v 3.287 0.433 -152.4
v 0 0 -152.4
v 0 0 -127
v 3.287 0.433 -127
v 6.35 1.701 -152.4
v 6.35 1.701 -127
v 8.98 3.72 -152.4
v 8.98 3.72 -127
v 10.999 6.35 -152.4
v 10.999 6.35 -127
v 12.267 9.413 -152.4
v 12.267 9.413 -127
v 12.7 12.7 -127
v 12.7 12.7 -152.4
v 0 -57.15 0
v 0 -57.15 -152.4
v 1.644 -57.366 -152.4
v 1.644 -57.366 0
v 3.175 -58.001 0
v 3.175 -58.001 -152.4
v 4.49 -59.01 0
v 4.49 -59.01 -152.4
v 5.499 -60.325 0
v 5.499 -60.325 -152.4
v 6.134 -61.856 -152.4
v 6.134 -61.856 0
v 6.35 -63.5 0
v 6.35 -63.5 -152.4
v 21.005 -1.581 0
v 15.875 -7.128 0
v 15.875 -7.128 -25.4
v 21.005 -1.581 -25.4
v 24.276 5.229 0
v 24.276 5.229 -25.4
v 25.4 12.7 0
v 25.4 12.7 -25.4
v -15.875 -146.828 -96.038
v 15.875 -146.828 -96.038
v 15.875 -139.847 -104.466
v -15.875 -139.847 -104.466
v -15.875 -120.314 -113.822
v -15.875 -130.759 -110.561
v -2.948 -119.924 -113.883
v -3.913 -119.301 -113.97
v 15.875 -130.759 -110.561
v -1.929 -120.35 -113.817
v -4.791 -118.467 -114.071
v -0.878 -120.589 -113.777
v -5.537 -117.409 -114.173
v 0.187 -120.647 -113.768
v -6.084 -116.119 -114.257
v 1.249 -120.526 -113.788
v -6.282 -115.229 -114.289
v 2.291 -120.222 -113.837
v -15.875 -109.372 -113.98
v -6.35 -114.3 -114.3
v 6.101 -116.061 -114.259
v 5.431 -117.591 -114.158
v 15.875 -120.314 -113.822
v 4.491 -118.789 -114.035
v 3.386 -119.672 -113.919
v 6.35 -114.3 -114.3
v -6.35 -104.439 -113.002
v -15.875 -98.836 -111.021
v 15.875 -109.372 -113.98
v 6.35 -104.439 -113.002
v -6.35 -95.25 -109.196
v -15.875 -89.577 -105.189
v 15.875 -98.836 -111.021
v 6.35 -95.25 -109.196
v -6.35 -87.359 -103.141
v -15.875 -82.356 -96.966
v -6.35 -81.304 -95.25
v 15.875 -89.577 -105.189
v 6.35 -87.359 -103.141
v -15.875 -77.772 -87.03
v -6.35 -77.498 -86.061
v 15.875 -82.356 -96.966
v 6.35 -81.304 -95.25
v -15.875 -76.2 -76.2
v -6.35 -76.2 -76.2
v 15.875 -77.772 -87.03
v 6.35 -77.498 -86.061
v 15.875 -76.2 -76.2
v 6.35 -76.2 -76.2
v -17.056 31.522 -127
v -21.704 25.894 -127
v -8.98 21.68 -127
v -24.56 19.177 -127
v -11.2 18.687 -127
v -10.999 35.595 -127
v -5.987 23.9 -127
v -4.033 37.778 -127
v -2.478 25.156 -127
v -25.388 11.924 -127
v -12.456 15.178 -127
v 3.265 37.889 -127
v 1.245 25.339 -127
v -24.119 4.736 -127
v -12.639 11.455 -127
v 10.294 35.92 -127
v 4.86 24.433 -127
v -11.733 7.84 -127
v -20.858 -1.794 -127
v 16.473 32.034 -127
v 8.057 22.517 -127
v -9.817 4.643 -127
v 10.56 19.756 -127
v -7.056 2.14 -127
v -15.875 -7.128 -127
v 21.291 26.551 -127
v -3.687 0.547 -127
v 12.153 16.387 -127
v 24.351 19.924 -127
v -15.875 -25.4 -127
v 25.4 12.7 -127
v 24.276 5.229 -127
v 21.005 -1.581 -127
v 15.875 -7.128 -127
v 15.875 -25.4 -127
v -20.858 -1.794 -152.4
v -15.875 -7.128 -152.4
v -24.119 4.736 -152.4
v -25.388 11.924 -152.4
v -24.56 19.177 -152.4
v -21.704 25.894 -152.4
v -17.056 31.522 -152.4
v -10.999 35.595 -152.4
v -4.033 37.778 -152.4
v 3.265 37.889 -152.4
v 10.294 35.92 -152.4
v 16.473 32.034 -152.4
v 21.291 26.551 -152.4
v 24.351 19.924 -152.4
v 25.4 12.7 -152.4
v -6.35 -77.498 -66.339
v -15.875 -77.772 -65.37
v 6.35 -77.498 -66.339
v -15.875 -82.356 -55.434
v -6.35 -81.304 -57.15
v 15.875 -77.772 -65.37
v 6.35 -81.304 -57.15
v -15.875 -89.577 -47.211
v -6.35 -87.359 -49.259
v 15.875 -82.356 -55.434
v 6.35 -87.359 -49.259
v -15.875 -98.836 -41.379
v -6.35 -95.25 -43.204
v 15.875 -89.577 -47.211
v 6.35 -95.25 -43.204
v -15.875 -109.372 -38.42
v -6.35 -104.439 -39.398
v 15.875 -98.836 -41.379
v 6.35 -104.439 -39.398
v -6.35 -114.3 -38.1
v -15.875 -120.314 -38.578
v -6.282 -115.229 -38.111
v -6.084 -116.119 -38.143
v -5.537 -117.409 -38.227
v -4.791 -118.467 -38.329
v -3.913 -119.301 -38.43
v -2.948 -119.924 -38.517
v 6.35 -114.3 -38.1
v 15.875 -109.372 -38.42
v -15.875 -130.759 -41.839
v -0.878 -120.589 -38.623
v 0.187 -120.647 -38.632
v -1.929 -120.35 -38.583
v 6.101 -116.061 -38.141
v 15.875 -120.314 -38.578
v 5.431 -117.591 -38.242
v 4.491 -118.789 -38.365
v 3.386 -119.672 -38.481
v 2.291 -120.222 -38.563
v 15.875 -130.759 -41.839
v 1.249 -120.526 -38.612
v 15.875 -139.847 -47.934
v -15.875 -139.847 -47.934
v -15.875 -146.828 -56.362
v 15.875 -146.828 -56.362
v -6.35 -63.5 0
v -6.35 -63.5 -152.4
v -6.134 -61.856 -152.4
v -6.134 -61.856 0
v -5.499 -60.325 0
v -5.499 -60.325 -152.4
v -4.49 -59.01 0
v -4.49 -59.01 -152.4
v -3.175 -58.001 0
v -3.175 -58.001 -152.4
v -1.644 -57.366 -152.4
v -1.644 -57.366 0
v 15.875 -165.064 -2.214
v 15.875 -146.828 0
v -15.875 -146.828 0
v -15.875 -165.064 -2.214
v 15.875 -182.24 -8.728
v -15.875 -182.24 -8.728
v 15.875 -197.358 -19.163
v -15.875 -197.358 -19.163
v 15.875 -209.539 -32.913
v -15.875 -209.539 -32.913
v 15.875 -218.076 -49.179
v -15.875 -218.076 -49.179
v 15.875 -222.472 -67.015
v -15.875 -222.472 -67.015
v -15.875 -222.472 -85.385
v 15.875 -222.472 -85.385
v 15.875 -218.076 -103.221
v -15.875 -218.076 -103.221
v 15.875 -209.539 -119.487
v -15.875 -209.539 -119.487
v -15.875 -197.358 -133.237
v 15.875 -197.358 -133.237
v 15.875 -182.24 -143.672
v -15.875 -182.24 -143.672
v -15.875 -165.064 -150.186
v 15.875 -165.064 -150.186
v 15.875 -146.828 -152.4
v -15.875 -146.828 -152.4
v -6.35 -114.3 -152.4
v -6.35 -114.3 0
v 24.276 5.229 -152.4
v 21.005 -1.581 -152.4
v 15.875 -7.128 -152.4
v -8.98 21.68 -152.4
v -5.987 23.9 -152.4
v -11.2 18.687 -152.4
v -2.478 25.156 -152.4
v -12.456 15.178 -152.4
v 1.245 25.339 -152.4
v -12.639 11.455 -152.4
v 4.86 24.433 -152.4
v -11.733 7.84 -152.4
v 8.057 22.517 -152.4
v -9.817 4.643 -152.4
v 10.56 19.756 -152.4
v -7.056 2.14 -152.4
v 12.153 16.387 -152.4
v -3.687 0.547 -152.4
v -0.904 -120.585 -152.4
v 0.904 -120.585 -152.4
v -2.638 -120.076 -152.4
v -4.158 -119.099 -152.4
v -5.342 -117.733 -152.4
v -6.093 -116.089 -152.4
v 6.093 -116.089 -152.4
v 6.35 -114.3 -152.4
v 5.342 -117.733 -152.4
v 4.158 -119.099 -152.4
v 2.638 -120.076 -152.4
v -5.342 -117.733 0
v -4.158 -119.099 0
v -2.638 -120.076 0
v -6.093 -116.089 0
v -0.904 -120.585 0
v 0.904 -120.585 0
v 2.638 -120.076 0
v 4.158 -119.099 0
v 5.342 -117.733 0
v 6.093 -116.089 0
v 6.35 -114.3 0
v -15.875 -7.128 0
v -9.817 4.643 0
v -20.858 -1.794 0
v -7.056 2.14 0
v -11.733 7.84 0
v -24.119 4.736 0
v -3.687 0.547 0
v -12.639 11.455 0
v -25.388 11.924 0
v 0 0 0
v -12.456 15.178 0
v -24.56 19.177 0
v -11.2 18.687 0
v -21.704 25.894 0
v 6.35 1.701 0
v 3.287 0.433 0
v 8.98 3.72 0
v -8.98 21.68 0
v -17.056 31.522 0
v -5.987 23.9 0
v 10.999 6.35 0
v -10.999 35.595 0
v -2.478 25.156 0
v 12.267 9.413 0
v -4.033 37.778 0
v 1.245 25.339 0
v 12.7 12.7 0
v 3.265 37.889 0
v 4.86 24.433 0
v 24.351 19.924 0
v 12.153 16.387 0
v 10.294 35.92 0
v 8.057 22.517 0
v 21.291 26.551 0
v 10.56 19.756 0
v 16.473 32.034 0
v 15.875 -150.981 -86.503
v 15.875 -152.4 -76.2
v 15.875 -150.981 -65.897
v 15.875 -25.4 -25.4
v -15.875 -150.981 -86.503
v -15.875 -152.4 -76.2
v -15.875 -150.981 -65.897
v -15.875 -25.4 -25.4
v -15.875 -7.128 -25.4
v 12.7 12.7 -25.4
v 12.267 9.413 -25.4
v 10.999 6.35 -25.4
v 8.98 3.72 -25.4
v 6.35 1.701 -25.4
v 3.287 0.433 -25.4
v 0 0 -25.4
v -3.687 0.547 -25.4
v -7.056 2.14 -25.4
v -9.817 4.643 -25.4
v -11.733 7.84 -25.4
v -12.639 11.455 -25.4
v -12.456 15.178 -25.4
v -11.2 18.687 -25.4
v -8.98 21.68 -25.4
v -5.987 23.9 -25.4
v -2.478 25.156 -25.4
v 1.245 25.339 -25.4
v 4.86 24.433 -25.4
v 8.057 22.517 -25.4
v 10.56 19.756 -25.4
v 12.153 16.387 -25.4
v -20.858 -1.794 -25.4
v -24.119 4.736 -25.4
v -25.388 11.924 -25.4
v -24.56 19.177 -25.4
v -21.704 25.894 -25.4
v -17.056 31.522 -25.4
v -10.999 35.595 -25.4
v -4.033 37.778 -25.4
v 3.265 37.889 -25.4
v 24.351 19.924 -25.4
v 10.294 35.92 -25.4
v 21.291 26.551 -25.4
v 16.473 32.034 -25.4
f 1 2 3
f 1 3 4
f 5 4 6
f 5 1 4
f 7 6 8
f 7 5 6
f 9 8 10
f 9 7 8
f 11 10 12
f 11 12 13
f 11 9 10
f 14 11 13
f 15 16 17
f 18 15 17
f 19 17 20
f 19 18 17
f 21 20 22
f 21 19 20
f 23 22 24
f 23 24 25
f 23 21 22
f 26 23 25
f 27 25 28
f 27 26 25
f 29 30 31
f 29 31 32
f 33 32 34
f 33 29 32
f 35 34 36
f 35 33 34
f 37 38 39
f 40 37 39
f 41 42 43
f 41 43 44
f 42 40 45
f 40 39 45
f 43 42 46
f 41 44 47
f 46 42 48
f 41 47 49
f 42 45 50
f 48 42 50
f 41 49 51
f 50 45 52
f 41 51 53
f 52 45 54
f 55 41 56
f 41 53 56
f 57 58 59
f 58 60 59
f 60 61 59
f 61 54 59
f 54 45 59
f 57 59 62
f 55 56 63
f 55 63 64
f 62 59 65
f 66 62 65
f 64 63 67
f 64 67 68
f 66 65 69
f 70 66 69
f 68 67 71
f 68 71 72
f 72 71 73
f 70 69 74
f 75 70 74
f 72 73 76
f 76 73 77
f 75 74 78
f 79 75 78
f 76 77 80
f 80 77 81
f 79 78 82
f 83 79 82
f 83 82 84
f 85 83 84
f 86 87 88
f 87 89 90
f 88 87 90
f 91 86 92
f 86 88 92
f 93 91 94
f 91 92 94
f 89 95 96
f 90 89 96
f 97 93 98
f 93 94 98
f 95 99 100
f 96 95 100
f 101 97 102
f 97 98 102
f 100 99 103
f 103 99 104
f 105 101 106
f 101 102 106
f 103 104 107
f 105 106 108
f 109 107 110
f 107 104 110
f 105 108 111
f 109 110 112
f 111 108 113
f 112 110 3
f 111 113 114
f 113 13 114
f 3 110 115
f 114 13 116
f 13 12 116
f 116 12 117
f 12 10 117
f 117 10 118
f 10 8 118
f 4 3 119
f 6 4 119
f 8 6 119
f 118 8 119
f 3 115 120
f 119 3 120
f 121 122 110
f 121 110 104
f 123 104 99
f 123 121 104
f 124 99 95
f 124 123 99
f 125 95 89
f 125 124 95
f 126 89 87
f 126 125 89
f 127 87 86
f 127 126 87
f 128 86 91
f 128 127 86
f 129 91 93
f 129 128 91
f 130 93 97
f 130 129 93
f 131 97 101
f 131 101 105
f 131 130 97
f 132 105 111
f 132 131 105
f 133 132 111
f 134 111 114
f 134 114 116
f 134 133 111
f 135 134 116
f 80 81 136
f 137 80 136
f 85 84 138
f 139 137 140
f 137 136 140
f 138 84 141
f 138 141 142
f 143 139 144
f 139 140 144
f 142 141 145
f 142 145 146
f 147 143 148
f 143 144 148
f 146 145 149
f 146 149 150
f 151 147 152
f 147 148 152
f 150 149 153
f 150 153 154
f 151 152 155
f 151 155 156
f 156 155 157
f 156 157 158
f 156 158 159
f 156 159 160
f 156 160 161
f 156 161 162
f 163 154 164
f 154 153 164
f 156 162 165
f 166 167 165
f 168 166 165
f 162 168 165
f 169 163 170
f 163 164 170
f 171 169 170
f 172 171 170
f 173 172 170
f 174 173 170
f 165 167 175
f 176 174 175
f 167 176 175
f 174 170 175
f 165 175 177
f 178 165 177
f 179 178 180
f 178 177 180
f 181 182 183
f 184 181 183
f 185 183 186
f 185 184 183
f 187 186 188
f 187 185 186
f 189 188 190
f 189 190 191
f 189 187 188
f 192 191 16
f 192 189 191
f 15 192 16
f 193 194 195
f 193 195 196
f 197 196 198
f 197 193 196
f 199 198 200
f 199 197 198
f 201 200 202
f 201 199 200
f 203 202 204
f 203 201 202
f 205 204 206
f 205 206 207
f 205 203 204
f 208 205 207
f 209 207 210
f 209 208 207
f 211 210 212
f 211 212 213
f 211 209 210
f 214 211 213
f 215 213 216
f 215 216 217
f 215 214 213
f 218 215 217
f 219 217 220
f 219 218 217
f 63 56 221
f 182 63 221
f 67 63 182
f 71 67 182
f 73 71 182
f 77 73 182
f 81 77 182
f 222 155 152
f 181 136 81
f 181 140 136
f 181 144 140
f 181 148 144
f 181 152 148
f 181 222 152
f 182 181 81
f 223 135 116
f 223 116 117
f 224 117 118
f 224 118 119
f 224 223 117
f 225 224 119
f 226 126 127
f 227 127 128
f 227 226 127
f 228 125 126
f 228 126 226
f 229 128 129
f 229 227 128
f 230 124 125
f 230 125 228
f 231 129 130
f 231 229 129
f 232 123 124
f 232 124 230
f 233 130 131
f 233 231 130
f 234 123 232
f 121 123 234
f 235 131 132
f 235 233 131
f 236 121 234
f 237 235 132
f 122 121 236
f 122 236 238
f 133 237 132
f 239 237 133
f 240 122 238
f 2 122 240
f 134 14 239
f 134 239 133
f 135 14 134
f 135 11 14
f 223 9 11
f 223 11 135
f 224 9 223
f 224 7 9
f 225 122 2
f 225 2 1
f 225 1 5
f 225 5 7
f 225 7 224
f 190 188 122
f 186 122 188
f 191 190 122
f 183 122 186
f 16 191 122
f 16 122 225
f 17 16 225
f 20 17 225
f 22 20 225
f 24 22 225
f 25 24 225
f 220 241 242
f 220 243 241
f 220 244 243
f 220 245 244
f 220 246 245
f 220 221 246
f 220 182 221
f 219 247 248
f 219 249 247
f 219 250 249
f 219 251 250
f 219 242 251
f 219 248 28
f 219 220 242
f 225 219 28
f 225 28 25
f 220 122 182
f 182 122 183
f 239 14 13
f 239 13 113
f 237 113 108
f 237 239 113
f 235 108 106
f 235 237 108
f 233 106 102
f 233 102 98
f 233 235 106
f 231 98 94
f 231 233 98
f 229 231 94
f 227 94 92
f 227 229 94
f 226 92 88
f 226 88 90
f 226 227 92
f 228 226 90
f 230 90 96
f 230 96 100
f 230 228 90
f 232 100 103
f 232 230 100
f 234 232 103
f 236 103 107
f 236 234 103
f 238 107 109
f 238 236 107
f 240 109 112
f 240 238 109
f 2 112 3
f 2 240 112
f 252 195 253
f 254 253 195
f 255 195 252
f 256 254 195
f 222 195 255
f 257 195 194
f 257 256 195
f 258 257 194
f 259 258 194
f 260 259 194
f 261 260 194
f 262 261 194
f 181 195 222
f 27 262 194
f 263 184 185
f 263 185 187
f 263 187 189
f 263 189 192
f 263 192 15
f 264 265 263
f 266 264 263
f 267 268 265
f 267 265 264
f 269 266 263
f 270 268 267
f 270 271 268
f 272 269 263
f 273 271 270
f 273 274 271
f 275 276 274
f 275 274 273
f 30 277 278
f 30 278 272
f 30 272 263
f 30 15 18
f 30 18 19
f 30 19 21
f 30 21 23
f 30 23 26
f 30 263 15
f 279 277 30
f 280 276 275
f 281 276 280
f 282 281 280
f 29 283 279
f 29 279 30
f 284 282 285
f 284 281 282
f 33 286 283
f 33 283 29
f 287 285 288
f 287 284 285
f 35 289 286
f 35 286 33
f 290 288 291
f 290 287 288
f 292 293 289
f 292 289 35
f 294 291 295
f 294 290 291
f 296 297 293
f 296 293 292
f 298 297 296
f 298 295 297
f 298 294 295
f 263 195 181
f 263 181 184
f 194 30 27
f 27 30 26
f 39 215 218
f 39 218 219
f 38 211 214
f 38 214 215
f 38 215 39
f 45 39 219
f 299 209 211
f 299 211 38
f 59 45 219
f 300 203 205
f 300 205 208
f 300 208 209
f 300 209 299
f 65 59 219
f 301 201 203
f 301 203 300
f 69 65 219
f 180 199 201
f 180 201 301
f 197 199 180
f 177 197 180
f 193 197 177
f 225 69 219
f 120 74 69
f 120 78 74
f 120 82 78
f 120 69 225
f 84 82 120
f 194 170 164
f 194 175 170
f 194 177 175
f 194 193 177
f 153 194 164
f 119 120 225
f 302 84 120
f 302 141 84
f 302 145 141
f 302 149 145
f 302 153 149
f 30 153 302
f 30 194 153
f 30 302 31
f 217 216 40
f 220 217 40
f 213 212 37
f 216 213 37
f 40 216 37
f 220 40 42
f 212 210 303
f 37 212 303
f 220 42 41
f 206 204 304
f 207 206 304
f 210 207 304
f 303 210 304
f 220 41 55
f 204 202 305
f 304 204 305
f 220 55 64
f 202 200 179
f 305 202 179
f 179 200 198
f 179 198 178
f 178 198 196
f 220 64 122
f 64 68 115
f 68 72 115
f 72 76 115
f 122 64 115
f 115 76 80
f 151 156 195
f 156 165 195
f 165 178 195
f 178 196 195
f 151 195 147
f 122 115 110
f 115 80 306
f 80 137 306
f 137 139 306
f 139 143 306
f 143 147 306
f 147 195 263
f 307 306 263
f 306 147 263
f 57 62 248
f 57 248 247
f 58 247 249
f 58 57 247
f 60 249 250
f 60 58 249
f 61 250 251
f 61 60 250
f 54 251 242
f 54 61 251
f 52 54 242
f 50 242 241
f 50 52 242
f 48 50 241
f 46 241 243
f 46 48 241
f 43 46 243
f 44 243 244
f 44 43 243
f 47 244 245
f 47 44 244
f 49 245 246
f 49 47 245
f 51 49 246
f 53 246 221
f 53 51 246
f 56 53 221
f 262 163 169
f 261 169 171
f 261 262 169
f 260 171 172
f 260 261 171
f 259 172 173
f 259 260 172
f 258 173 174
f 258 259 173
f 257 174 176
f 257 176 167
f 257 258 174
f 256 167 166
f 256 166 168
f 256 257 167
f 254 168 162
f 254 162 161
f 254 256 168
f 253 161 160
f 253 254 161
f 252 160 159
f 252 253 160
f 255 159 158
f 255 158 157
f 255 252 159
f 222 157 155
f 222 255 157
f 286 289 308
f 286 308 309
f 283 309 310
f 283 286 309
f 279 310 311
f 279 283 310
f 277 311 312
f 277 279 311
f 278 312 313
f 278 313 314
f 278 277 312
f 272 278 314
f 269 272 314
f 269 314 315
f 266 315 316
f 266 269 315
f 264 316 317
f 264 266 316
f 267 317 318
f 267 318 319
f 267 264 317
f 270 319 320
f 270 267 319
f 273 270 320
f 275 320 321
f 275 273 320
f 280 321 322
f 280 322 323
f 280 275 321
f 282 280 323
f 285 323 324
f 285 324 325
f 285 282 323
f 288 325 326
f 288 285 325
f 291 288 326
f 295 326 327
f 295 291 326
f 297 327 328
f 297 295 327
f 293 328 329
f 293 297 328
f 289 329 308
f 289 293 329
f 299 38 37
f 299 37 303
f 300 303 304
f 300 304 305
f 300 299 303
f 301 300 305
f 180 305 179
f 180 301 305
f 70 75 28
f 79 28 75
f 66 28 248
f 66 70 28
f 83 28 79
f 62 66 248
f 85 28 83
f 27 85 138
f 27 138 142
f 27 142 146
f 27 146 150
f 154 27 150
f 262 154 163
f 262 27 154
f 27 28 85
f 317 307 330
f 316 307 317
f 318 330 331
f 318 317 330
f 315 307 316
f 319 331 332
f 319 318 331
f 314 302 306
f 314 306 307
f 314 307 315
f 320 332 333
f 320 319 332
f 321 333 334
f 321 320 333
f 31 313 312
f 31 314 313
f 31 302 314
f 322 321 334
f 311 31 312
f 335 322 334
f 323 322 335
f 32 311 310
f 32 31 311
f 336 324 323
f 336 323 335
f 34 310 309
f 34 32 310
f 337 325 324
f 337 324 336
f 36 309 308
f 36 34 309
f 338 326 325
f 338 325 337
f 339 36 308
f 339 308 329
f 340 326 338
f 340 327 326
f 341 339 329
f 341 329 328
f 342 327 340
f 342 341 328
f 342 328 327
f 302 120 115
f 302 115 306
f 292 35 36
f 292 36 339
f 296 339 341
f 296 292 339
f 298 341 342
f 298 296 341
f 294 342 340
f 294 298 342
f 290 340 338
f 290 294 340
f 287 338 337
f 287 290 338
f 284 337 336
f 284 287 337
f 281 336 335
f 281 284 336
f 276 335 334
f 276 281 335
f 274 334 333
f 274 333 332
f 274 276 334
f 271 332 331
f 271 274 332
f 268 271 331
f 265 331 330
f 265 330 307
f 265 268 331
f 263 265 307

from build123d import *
from build123d import SkipClean  # not in build123d's __all__

# Parameters (mm, degrees)
F1_DEPTH = 152.4
F2_DEPTH = 25.4
F4_DEPTH = 31.75
F5_DEPTH = 41.276
F3_W     = 18.2721313551
F3_H     = 101.6
F6_DEPTH = 41.276
F8_DEPTH = 25.4


with BuildPart() as f1:
    # F0 (on Top) → F1 (new body)
    with BuildSketch(Plane.XY):
        with BuildLine():
            ThreePointArc((15.875, -7.1278686449), (8.4122570223, -11.266516889), (0, -12.7))
            ThreePointArc((0, -12.7), (-8.4122570223, -11.266516889), (-15.875, -7.1278686449))
            Line((-15.875, -7.1278686449), (-15.875, -146.8278686449))
            Line((-15.875, -146.8278686449), (15.875, -146.8278686449))
            Line((15.875, -146.8278686449), (15.875, -7.1278686449))
        make_face()
        with BuildLine():
            ThreePointArc((-6.35, -63.5), (-4.4901280605, -59.0098719395), (0, -57.15))
            ThreePointArc((0, -57.15), (4.4901280605, -59.0098719395), (6.35, -63.5))
            Line((6.35, -63.5), (6.35, -114.3))
            ThreePointArc((6.35, -114.3), (0, -120.65), (-6.35, -114.3))
            Line((-6.35, -114.3), (-6.35, -63.5))
        make_face(mode=Mode.SUBTRACT)
        with BuildLine():
            Line((15.875, -7.1278686449), (0, -7.1278686449))
            Line((0, -7.1278686449), (0, -12.7))
            ThreePointArc((0, -12.7), (8.4122570223, -11.266516889), (15.875, -7.1278686449))
        make_face()
        with BuildLine():
            Line((0, -12.7), (0, -7.1278686449))
            Line((0, -7.1278686449), (-15.875, -7.1278686449))
            ThreePointArc((-15.875, -7.1278686449), (-8.4122570223, -11.266516889), (0, -12.7))
        make_face()
    extrude(amount=-F1_DEPTH)

    # F0 (on Top) → F2 (join)
    with BuildSketch(Plane.XY):
        with BuildLine():
            Line((-15.875, -7.1278686449), (0, -7.1278686449))
            Line((0, -7.1278686449), (15.875, -7.1278686449))
            ThreePointArc((15.875, -7.1278686449), (22.8952505992, 1.7014773719), (25.4, 12.7))
            ThreePointArc((25.4, 12.7), (-10.9985226281, 35.5952505992), (-15.875, -7.1278686449))
        make_face()
        with BuildLine():
            ThreePointArc((12.7, 12.7), (8.9802561211, 3.7197438789), (0, 0))
            ThreePointArc((0, 0), (-8.9802561211, 21.6802561211), (12.7, 12.7))
        make_face(mode=Mode.SUBTRACT)
    extrude(amount=-F2_DEPTH)

    # F3 (on face) → F4 (join)
    with BuildSketch(Plane.YZ.offset(15.875)):
        with BuildLine():
            Line((-146.8278686449, -56.3619617548), (-146.8278686449, 0))
            ThreePointArc((-146.8278686449, 0), (-223.0278686449, -76.2), (-146.8278686449, -152.4))
            Line((-146.8278686449, -152.4), (-146.8278686449, -96.0380382452))
            ThreePointArc((-146.8278686449, -96.0380382452), (-152.4, -76.2), (-146.8278686449, -56.3619617548))
        make_face()
    extrude(amount=-F4_DEPTH)

    # F3 (on face) → F5 (cut, through all)
    with BuildSketch(Plane.YZ.offset(15.875)):
        with BuildLine():
            ThreePointArc((-76.2, -76.2), (-103.9971313551, -39.5194752261), (-146.8278686449, -56.3619617548))
            Line((-146.8278686449, -56.3619617548), (-146.8278686449, -96.0380382452))
            ThreePointArc((-146.8278686449, -96.0380382452), (-103.9971313551, -112.8805247739), (-76.2, -76.2))
        make_face()
    with SkipClean():  # cleaning this boolean's faces spoils the solid; the shape is the same uncleaned
        extrude(amount=-F5_DEPTH, mode=Mode.SUBTRACT)

    # F3 (on face) → F6 (cut, through all)
    with BuildSketch(Plane.YZ.offset(15.875)):
        with Locations((-16.2639343225, -76.2)):
            Rectangle(F3_W, F3_H)
    extrude(amount=-F6_DEPTH, mode=Mode.SUBTRACT)

    # F7 (on face) → F8 (join)
    with BuildSketch(Plane(origin=(0, 0, -152.4), x_dir=(1, 0, 0), z_dir=(0, 0, -1))):
        with BuildLine():
            ThreePointArc((-15.875, 7.1278686449), (-10.9985226281, -35.5952505992), (25.4, -12.7))
            ThreePointArc((25.4, -12.7), (22.8952505992, -1.7014773719), (15.875, 7.1278686449))
            Line((15.875, 7.1278686449), (-15.875, 7.1278686449))
        make_face()
        with BuildLine():
            ThreePointArc((0, 0), (8.9802561211, -3.7197438789), (12.7, -12.7))
            ThreePointArc((12.7, -12.7), (-8.9802561211, -21.6802561211), (0, 0))
        make_face(mode=Mode.SUBTRACT)
    extrude(amount=-F8_DEPTH)


solid = f1.part
